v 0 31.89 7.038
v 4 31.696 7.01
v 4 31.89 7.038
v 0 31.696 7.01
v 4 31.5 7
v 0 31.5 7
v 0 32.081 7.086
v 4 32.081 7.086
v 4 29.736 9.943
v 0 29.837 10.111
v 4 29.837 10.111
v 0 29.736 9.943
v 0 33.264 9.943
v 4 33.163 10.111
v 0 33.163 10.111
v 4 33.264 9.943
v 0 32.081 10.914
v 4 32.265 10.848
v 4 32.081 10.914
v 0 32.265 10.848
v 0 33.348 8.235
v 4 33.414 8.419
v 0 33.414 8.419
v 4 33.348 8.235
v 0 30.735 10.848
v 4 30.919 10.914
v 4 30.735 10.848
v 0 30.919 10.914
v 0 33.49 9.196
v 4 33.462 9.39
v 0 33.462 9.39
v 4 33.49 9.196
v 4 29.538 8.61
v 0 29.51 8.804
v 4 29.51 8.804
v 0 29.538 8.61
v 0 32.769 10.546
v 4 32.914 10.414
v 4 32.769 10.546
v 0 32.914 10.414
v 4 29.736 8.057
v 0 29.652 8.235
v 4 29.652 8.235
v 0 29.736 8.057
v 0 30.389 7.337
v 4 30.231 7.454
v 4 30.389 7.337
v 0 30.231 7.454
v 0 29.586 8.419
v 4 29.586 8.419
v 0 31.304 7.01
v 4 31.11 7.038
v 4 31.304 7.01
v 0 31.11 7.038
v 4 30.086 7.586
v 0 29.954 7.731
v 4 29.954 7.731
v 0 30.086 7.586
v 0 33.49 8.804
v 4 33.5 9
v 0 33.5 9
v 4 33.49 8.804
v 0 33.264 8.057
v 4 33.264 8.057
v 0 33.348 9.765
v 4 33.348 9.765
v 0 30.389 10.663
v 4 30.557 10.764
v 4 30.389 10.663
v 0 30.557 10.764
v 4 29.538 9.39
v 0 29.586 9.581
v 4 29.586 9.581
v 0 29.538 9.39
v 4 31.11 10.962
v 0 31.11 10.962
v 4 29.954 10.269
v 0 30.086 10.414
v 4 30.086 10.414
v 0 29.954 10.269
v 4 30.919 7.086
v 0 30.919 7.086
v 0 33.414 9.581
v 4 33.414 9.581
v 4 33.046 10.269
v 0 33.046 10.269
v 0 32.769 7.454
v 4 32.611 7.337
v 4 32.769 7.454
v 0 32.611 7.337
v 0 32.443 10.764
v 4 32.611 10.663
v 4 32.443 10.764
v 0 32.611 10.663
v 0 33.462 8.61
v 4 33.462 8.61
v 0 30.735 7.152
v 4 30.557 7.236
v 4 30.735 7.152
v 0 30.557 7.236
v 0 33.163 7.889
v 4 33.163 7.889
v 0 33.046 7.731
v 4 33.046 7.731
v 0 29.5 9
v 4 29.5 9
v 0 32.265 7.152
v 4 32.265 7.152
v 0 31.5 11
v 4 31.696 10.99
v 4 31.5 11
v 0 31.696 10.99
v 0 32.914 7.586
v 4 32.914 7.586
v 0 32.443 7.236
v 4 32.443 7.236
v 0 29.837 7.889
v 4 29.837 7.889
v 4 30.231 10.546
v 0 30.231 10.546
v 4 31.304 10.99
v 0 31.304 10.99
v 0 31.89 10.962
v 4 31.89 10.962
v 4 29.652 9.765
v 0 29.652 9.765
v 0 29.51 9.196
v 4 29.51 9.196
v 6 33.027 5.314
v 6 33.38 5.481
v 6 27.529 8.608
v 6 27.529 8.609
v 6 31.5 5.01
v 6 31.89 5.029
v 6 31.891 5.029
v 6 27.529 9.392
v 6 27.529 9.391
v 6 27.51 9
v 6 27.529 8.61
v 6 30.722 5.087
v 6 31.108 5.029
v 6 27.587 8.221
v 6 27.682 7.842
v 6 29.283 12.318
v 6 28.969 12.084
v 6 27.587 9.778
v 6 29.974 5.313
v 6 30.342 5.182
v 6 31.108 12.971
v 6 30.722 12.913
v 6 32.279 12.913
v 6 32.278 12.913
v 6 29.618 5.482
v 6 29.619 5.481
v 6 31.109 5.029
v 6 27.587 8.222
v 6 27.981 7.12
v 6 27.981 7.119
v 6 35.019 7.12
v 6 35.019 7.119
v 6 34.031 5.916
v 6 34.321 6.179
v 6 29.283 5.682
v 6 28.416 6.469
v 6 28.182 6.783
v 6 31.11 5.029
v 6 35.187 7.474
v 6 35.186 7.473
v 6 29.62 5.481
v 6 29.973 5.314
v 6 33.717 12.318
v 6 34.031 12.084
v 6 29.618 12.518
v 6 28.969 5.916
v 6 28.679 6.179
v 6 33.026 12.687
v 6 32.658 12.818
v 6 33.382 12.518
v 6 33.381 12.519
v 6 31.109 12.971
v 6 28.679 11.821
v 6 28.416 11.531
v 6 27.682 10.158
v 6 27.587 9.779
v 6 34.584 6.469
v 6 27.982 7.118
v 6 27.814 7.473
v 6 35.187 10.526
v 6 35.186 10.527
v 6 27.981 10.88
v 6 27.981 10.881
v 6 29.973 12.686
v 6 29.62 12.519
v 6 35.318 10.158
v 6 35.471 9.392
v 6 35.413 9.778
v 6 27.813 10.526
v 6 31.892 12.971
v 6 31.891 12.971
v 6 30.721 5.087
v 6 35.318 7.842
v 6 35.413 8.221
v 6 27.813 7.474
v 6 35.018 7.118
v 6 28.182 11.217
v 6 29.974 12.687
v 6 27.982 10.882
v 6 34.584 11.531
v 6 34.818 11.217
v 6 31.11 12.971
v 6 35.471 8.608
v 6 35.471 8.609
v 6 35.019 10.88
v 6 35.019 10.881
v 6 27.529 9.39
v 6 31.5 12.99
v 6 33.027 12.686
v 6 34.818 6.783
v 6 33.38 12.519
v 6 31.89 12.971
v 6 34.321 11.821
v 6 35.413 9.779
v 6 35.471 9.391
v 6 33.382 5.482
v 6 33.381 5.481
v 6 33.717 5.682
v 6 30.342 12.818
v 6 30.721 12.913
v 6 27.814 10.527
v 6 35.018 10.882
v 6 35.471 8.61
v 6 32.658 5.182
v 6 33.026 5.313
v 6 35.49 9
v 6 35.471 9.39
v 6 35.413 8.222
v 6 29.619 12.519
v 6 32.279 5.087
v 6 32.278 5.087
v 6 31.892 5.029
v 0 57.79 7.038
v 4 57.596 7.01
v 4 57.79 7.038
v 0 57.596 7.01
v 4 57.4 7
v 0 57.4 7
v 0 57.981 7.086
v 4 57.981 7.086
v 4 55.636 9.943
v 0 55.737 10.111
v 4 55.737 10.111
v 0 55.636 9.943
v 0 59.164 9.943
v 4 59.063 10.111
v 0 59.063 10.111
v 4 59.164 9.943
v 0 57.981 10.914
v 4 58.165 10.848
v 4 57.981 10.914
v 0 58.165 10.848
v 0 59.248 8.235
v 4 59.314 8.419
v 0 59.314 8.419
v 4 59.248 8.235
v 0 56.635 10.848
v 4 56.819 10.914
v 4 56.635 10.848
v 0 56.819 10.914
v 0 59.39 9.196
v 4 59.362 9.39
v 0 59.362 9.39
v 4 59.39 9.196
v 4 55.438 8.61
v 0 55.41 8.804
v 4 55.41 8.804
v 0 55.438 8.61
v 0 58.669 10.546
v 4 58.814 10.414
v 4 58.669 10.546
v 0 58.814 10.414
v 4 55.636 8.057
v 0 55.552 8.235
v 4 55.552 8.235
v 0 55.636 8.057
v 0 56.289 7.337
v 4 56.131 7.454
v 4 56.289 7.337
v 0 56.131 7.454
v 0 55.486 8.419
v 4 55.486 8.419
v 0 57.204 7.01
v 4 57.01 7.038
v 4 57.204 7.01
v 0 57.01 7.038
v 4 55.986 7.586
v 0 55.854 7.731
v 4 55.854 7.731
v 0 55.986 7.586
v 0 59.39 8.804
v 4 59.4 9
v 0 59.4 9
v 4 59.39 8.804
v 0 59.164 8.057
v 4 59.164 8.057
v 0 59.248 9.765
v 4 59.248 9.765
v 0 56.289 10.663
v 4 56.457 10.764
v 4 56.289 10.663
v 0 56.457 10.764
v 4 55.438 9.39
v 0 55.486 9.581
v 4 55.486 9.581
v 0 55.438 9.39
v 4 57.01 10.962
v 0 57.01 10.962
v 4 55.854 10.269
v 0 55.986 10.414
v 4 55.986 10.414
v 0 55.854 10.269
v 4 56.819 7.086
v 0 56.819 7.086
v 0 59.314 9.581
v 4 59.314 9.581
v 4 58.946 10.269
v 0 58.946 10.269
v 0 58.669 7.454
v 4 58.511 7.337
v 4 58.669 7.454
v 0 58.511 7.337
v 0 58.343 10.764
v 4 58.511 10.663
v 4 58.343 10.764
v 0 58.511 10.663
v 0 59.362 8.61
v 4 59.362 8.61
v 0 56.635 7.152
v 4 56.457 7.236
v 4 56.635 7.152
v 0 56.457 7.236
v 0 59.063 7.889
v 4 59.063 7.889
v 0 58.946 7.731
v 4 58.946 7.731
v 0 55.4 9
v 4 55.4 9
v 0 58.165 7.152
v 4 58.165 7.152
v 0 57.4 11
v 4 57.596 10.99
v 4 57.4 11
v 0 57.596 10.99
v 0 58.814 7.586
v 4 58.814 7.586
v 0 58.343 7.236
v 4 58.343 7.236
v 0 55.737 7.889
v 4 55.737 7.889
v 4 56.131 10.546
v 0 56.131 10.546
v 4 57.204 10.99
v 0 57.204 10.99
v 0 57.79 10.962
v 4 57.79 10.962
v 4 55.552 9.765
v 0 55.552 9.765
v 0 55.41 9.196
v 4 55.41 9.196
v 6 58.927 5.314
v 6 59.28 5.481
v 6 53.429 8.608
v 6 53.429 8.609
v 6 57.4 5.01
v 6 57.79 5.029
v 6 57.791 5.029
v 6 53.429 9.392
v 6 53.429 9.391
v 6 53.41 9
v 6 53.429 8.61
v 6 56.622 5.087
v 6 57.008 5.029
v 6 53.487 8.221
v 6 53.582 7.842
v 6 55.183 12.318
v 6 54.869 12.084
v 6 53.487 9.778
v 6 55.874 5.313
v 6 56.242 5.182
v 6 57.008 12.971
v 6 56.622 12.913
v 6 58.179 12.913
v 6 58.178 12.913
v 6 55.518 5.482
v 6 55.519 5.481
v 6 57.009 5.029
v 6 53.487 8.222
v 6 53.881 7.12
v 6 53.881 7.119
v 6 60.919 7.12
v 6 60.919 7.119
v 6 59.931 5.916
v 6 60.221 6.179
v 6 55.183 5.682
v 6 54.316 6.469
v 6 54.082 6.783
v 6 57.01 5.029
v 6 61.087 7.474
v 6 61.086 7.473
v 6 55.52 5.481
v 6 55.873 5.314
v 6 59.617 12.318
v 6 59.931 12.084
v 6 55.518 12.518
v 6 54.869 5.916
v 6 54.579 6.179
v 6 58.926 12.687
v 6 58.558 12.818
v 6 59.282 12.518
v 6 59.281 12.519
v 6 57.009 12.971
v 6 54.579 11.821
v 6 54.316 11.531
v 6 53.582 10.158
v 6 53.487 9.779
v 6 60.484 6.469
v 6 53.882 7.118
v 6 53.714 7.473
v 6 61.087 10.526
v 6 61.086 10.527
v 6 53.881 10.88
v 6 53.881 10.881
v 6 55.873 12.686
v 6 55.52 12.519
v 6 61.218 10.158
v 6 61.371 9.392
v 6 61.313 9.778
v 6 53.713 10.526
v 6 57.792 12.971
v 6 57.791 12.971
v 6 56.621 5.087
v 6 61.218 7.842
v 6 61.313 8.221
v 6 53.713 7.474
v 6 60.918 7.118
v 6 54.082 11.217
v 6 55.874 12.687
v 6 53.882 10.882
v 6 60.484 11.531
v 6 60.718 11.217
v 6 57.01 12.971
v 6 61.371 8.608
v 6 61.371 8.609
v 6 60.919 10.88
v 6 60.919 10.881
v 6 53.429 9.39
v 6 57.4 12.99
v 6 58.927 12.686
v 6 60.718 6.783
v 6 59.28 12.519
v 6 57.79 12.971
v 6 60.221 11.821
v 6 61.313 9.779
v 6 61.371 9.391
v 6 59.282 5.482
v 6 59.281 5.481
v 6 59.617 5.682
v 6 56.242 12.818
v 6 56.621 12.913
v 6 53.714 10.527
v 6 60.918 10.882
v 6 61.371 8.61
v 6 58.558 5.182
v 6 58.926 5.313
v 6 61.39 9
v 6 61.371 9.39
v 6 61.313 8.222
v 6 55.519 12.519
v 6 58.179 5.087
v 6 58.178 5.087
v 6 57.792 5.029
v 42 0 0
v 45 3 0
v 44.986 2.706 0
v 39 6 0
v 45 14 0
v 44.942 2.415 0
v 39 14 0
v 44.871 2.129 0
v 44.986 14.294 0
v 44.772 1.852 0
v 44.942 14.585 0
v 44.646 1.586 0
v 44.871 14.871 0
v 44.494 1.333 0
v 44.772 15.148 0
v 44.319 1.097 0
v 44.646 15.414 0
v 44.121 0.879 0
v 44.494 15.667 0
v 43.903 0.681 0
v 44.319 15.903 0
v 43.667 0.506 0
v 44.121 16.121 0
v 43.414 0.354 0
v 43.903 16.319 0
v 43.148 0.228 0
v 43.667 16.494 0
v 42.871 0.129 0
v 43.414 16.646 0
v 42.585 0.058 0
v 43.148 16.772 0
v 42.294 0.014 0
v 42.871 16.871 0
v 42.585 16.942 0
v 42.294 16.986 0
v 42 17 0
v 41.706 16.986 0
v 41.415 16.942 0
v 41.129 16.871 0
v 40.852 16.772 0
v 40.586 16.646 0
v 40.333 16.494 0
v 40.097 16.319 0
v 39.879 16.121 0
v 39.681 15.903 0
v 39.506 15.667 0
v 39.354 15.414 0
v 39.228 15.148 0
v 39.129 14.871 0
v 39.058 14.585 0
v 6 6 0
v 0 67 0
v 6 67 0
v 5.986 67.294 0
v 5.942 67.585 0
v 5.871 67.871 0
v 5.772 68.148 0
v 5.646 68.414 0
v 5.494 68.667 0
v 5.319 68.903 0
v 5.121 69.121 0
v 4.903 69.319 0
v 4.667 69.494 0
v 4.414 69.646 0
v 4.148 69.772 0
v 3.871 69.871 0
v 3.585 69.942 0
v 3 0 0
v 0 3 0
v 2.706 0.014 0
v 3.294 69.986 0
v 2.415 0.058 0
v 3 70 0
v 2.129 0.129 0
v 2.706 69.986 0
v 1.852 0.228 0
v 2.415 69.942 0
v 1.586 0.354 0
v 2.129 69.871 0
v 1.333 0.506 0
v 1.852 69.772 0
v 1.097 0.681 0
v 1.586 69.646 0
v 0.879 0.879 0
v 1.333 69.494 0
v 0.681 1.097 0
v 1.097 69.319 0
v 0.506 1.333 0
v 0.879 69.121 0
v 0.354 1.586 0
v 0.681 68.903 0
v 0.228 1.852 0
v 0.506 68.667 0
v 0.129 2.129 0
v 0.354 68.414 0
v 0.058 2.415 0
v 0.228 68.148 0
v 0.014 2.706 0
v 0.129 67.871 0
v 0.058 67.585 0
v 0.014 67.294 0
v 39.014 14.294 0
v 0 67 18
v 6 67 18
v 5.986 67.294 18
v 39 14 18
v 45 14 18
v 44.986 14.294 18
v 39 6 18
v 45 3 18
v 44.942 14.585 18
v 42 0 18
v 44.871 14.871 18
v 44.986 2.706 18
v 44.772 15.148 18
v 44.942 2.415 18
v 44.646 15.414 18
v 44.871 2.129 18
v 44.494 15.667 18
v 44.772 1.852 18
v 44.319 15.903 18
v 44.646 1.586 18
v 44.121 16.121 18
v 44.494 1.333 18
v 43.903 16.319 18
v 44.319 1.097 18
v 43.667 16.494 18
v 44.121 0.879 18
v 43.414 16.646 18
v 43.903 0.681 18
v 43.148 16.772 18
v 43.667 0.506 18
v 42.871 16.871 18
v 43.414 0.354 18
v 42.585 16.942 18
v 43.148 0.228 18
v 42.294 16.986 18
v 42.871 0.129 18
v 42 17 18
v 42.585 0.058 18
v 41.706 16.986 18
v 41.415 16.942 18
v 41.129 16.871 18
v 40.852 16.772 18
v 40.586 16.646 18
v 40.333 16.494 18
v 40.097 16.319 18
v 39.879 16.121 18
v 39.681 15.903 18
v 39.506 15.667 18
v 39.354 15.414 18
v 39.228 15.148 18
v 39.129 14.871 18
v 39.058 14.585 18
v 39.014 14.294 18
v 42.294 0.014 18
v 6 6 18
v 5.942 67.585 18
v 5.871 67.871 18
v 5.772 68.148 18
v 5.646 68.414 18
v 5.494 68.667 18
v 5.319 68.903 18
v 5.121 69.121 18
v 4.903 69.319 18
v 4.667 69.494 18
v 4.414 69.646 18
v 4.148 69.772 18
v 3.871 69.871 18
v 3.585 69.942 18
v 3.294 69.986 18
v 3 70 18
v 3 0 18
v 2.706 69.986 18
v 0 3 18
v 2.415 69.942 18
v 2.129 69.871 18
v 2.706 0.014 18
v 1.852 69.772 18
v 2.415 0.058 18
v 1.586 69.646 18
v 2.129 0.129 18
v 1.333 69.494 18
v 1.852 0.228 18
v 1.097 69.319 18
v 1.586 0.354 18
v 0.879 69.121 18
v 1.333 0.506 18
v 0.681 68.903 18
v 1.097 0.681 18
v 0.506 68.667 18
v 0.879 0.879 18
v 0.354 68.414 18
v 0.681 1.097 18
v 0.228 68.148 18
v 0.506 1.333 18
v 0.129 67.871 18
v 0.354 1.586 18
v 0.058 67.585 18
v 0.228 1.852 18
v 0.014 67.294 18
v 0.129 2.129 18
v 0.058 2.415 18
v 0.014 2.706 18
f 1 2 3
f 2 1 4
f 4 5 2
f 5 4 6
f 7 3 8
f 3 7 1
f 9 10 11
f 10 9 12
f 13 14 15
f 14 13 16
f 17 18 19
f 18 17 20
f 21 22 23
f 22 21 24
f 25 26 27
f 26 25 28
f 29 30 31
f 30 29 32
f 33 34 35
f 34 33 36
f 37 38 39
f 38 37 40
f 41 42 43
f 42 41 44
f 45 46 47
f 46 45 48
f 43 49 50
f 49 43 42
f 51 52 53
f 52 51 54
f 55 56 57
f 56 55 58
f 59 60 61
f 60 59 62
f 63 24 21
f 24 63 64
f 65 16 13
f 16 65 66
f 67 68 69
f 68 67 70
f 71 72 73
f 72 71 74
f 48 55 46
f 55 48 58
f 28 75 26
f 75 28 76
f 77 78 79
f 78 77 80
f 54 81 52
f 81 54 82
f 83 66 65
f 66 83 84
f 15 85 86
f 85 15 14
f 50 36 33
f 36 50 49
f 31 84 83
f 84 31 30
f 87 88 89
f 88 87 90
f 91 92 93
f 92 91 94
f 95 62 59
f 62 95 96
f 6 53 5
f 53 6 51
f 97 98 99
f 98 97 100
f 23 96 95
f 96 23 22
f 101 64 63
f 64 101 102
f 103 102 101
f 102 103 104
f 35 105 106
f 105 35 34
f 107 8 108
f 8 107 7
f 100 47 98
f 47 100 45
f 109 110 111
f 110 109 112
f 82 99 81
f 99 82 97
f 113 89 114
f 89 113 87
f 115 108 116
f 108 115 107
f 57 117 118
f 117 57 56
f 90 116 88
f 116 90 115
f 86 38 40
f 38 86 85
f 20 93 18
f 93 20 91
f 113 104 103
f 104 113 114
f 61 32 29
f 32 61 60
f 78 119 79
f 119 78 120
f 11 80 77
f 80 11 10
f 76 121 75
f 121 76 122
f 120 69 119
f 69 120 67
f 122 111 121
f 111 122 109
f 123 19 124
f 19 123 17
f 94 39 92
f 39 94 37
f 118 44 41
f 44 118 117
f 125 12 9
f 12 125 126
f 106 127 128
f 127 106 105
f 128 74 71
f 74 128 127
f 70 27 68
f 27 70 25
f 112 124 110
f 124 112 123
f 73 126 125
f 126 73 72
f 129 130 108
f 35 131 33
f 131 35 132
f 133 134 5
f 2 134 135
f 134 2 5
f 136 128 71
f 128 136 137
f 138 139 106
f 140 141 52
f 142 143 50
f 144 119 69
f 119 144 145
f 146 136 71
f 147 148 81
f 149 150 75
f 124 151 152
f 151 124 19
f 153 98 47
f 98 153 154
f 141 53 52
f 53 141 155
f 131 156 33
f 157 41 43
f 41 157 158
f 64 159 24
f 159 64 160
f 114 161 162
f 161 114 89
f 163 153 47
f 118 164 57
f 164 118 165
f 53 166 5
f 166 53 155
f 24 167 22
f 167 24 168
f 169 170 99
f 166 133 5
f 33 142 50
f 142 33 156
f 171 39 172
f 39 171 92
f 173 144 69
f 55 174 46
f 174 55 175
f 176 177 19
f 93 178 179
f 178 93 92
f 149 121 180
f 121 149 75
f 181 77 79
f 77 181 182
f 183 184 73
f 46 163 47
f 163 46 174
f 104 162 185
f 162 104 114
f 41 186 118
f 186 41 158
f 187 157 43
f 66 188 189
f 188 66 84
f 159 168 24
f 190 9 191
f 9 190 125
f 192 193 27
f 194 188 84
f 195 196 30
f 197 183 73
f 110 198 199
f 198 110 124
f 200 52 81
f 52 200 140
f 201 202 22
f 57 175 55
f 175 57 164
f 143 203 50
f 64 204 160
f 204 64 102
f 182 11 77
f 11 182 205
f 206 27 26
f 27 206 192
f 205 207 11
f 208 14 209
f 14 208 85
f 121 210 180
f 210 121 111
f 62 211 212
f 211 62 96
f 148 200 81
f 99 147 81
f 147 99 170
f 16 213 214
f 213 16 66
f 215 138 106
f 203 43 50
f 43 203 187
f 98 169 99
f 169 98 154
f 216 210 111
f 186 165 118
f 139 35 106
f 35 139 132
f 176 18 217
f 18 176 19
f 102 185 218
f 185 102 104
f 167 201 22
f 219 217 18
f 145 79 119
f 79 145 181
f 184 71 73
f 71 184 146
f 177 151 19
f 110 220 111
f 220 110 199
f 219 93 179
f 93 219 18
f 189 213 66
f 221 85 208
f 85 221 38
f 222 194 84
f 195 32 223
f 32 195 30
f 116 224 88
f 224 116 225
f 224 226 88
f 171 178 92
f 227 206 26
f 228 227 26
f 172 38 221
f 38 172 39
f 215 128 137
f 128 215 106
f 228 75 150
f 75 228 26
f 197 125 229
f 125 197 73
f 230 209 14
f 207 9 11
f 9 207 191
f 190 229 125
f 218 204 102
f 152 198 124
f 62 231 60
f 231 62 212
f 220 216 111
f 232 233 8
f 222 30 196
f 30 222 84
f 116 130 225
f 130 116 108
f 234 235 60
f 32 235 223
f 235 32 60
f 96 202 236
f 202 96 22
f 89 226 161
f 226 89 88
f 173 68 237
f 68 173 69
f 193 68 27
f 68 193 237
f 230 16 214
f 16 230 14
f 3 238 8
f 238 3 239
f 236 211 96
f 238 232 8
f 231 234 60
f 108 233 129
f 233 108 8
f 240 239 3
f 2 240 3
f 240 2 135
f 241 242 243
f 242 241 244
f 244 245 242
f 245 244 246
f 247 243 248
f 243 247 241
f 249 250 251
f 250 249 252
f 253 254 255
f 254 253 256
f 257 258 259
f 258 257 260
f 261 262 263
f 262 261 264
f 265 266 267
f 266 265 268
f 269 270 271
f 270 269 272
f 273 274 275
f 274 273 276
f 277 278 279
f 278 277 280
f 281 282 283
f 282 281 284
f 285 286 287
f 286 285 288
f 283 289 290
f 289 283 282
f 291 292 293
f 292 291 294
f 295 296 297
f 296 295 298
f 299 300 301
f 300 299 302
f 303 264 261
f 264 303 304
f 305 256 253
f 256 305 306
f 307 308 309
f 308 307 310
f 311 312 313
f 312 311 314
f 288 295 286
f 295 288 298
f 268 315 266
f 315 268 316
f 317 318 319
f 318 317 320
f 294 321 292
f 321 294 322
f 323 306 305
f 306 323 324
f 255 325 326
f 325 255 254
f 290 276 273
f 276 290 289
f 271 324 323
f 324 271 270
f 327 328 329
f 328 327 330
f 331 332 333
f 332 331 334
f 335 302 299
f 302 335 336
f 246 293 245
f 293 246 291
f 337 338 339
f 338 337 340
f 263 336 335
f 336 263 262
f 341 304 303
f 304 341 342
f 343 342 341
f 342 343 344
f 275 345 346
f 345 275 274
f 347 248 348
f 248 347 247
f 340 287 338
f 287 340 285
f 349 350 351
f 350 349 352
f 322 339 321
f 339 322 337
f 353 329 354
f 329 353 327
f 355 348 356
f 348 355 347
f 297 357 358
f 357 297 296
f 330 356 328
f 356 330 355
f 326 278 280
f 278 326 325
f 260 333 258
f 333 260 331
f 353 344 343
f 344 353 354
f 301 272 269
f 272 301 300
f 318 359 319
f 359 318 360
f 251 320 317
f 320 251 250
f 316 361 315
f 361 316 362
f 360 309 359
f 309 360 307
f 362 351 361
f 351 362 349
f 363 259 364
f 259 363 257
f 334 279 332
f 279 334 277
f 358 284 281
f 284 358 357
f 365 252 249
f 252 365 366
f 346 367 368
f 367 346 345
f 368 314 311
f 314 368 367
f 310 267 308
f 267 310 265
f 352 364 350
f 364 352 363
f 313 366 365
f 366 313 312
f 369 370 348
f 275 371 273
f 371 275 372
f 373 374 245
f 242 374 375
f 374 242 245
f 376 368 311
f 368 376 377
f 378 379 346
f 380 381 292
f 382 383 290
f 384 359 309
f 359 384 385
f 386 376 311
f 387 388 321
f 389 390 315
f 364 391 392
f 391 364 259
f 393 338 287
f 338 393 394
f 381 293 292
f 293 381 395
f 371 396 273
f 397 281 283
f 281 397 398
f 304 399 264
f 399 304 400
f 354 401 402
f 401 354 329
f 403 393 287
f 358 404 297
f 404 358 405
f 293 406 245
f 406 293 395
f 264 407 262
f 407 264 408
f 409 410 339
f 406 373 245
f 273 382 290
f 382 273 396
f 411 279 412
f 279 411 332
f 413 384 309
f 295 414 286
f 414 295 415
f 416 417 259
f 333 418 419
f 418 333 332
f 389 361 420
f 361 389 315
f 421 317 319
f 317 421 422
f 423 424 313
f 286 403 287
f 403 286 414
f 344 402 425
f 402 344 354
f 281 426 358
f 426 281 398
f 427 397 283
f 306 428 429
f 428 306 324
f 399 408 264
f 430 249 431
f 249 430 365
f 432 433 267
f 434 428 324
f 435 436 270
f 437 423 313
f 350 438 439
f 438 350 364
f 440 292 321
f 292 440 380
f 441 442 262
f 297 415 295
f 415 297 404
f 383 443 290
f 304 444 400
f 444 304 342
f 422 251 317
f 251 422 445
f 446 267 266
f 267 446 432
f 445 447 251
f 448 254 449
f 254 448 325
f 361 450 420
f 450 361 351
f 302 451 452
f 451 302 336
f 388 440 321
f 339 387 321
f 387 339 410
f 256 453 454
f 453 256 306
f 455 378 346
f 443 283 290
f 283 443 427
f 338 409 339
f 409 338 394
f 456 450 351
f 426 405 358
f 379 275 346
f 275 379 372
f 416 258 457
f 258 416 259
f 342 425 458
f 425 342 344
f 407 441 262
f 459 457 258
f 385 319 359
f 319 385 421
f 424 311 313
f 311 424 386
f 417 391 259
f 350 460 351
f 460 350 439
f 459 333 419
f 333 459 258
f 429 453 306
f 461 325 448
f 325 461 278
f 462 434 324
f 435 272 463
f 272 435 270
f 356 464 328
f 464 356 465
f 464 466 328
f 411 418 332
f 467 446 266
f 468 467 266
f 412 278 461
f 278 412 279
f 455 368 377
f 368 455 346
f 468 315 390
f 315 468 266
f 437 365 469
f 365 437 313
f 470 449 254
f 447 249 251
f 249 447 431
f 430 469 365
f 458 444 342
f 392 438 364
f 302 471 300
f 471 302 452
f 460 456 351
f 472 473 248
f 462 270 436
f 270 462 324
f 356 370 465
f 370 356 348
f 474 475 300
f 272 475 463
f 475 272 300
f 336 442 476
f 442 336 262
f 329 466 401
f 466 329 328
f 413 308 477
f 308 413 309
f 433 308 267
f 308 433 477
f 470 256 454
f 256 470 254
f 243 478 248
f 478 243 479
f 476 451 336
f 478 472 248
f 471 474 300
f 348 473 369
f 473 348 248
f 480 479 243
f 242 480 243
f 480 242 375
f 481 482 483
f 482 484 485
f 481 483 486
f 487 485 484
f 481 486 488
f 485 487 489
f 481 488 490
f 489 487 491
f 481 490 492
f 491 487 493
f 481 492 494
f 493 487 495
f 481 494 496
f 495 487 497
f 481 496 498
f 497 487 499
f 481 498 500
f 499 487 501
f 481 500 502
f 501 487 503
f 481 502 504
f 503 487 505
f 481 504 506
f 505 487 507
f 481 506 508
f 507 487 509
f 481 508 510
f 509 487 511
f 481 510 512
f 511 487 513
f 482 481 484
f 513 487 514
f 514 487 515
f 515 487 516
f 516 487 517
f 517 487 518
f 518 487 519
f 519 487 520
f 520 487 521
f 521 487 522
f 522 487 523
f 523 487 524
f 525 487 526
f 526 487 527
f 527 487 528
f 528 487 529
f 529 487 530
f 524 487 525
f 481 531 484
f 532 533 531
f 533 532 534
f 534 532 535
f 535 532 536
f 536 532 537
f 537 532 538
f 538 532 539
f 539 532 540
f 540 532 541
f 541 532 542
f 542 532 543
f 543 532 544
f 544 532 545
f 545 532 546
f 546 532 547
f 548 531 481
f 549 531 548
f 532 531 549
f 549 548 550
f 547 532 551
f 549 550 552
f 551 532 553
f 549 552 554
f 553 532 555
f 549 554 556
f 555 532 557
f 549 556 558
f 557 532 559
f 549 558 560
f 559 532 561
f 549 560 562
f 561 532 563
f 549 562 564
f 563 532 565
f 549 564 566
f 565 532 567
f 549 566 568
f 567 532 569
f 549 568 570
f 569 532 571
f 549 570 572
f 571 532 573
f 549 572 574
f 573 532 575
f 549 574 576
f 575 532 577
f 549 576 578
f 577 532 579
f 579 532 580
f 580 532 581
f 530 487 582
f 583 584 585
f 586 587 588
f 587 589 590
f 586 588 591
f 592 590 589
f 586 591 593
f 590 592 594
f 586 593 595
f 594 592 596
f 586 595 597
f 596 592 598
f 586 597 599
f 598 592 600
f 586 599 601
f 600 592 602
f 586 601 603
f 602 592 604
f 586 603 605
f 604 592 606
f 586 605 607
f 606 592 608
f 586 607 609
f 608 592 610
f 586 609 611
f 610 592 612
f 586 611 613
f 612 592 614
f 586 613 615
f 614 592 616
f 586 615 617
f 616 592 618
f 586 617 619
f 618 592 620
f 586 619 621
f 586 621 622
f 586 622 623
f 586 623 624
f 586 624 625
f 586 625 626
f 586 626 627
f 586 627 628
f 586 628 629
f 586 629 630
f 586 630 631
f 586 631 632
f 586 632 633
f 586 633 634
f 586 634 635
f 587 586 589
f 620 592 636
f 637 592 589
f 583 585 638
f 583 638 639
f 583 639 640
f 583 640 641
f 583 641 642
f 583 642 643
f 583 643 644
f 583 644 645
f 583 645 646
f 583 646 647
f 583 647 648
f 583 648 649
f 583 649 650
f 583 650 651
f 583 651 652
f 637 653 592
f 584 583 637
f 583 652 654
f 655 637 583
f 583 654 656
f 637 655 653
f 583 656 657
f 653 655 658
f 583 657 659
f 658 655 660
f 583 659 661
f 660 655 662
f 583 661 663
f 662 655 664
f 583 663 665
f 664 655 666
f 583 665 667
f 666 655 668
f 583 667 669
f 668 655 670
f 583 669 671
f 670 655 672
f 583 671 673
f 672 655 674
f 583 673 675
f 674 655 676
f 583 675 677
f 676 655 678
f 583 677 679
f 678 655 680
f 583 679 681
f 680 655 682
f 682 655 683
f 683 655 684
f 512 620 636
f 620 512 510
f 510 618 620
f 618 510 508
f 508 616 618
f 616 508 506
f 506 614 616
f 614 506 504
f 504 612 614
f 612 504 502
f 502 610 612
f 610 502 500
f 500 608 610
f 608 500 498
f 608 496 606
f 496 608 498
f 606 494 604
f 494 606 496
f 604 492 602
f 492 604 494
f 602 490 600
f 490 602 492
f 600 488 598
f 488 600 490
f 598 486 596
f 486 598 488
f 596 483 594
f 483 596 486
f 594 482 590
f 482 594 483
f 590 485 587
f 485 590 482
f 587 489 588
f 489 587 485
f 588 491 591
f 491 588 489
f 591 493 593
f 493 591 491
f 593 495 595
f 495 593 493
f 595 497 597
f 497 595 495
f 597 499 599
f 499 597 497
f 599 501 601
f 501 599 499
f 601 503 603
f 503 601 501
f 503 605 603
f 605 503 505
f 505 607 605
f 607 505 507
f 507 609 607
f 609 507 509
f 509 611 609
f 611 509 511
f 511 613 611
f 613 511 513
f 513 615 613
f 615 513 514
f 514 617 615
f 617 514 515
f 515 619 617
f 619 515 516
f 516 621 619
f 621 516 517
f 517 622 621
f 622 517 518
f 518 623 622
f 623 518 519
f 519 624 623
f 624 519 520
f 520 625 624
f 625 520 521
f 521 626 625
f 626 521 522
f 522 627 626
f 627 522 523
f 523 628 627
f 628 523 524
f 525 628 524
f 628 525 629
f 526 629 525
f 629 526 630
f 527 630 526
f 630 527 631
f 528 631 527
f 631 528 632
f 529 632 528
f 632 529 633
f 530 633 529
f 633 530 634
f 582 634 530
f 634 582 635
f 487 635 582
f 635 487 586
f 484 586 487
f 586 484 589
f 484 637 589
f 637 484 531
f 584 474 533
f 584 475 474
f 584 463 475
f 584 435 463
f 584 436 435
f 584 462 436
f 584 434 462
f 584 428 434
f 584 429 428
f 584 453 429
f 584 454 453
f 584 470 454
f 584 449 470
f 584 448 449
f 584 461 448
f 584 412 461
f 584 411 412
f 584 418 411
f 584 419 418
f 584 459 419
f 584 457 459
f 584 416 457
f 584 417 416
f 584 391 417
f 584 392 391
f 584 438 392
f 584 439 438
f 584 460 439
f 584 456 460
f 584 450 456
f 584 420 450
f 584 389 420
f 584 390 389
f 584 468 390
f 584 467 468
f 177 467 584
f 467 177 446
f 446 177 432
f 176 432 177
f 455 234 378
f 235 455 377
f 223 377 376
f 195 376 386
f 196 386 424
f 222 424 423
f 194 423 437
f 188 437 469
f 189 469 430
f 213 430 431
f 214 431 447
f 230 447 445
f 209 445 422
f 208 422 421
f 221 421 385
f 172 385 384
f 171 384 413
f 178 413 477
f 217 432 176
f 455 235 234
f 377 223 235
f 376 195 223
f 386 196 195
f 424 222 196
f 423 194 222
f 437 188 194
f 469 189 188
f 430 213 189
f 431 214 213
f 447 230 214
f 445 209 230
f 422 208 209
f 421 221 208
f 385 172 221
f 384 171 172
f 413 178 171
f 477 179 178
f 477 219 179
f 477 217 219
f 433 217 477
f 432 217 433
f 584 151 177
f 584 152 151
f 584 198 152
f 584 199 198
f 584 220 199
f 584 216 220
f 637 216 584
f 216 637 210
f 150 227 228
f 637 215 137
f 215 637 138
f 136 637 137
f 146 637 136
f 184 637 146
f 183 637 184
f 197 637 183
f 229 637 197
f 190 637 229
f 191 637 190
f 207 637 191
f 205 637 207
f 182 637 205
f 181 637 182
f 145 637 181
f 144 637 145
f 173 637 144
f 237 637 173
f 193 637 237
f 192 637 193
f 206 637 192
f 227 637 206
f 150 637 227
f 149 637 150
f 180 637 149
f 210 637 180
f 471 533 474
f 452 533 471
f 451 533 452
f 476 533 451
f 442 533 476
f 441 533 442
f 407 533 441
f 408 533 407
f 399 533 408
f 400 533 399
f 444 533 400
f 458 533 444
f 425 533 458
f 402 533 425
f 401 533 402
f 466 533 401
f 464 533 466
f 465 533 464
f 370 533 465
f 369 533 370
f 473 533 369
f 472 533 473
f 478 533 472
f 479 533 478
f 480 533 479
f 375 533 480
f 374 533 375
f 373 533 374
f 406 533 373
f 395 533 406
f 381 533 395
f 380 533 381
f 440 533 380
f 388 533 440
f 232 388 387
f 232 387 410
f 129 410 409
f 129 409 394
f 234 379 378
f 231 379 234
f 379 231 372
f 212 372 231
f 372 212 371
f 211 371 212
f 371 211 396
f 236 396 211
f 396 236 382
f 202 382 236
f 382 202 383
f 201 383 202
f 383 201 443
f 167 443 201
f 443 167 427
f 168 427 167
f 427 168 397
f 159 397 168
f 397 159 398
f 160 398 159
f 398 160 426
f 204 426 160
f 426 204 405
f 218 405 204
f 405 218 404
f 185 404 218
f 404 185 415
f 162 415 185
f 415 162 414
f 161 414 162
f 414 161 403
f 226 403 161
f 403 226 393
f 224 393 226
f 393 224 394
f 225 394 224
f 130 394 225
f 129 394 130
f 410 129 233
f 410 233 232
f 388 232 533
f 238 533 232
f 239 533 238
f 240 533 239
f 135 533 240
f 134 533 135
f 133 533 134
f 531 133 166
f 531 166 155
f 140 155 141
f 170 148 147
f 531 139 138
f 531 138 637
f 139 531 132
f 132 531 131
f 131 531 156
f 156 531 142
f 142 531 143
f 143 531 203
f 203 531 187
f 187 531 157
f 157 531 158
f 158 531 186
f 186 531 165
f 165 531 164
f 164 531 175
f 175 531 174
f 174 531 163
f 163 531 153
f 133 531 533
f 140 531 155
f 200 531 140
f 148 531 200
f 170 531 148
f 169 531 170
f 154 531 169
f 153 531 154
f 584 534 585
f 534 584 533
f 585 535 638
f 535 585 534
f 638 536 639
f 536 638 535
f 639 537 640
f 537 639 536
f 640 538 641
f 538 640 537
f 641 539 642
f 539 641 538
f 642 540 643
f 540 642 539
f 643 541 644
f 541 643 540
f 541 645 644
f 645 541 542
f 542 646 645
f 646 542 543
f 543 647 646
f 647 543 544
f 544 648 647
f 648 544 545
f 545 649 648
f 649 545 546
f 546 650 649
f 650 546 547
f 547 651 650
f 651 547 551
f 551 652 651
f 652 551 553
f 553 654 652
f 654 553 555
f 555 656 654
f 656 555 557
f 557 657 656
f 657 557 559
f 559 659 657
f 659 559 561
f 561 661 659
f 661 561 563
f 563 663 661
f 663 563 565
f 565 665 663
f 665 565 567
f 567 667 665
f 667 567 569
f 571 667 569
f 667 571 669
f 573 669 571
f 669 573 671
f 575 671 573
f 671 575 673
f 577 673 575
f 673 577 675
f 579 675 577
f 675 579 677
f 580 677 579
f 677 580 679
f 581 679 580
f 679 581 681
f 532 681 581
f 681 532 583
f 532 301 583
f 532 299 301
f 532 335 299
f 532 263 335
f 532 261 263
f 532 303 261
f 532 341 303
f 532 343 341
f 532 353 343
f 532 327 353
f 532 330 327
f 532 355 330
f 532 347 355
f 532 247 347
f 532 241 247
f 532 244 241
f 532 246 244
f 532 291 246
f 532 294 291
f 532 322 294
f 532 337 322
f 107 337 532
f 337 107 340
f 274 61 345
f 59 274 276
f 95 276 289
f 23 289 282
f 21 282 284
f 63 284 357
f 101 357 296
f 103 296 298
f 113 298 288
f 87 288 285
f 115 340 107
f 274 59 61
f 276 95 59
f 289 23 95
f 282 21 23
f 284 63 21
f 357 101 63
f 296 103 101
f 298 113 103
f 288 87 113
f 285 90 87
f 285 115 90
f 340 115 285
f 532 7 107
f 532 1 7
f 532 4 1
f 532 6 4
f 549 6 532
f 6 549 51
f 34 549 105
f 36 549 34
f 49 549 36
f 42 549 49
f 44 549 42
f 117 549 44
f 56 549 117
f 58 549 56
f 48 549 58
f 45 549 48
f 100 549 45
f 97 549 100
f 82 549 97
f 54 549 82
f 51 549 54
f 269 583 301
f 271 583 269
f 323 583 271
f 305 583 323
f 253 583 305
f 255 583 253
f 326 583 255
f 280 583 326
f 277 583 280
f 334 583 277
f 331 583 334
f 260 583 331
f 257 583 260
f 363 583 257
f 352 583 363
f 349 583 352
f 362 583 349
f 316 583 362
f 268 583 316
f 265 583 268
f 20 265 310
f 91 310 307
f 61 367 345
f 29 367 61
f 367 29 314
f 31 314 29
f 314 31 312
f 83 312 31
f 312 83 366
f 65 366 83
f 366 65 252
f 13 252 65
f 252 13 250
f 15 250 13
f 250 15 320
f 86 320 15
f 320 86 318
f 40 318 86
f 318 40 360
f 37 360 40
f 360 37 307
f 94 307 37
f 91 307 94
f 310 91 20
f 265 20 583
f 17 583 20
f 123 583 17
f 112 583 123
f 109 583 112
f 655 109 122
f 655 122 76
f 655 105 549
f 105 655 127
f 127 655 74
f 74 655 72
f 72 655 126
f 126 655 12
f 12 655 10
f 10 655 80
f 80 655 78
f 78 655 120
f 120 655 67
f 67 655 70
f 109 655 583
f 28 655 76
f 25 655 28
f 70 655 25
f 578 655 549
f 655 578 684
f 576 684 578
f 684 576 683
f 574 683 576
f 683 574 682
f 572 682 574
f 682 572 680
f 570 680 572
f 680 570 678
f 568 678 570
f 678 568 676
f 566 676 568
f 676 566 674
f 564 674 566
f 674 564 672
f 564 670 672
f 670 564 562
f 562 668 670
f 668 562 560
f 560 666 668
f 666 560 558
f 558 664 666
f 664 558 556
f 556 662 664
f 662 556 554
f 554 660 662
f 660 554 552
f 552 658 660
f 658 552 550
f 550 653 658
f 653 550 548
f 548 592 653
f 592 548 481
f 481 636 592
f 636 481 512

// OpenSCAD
// Wall hook: screws to the wall; the hook curls up at the tip so bags, keys or headphones stay on.
// Printed lying on its side for strength along the hook.

/* [Size] */
// Width (mm)
width = 18; // [10:1:40]
// Plate height (mm)
plate_height = 70; // [40:1:120]
// Reach (mm)
reach = 45; // [20:1:90]
// Tip height (mm)
tip = 14; // [6:1:30]

/* [Strength] */
// Thickness (mm)
thickness = 6; // [4:0.5:10]

/* [Screws] */
// Screw size (mm)
screw_d = 4; // [3:0.1:6]
// Screw head (mm)
head_d = 8; // [6:0.5:12]

/* [Hidden] */
$fn = $preview ? 32 : 64;
r = thickness / 2;

module profile() {
  // wall plate
  hull() {
    translate([r, r]) circle(r);
    translate([r, plate_height - r]) circle(r);
  }
  // arm out from the bottom
  hull() {
    translate([r, r]) circle(r);
    translate([reach - r, r]) circle(r);
  }
  // upturned tip
  hull() {
    translate([reach - r, r]) circle(r);
    translate([reach - r, tip]) circle(r);
  }
}

difference() {
  linear_extrude(width) profile();
  // two countersunk screw holes through the plate (wall side at x = 0)
  for (z = [plate_height * 0.45, plate_height * 0.82])
    translate([-1, z, width / 2]) rotate([0, 90, 0]) {
      cylinder(d = screw_d, h = thickness + 2);
      translate([0, 0, thickness + 1 - (head_d - screw_d) / 2]) cylinder(d1 = screw_d, d2 = head_d, h = (head_d - screw_d) / 2 + 0.01);
    }
}
